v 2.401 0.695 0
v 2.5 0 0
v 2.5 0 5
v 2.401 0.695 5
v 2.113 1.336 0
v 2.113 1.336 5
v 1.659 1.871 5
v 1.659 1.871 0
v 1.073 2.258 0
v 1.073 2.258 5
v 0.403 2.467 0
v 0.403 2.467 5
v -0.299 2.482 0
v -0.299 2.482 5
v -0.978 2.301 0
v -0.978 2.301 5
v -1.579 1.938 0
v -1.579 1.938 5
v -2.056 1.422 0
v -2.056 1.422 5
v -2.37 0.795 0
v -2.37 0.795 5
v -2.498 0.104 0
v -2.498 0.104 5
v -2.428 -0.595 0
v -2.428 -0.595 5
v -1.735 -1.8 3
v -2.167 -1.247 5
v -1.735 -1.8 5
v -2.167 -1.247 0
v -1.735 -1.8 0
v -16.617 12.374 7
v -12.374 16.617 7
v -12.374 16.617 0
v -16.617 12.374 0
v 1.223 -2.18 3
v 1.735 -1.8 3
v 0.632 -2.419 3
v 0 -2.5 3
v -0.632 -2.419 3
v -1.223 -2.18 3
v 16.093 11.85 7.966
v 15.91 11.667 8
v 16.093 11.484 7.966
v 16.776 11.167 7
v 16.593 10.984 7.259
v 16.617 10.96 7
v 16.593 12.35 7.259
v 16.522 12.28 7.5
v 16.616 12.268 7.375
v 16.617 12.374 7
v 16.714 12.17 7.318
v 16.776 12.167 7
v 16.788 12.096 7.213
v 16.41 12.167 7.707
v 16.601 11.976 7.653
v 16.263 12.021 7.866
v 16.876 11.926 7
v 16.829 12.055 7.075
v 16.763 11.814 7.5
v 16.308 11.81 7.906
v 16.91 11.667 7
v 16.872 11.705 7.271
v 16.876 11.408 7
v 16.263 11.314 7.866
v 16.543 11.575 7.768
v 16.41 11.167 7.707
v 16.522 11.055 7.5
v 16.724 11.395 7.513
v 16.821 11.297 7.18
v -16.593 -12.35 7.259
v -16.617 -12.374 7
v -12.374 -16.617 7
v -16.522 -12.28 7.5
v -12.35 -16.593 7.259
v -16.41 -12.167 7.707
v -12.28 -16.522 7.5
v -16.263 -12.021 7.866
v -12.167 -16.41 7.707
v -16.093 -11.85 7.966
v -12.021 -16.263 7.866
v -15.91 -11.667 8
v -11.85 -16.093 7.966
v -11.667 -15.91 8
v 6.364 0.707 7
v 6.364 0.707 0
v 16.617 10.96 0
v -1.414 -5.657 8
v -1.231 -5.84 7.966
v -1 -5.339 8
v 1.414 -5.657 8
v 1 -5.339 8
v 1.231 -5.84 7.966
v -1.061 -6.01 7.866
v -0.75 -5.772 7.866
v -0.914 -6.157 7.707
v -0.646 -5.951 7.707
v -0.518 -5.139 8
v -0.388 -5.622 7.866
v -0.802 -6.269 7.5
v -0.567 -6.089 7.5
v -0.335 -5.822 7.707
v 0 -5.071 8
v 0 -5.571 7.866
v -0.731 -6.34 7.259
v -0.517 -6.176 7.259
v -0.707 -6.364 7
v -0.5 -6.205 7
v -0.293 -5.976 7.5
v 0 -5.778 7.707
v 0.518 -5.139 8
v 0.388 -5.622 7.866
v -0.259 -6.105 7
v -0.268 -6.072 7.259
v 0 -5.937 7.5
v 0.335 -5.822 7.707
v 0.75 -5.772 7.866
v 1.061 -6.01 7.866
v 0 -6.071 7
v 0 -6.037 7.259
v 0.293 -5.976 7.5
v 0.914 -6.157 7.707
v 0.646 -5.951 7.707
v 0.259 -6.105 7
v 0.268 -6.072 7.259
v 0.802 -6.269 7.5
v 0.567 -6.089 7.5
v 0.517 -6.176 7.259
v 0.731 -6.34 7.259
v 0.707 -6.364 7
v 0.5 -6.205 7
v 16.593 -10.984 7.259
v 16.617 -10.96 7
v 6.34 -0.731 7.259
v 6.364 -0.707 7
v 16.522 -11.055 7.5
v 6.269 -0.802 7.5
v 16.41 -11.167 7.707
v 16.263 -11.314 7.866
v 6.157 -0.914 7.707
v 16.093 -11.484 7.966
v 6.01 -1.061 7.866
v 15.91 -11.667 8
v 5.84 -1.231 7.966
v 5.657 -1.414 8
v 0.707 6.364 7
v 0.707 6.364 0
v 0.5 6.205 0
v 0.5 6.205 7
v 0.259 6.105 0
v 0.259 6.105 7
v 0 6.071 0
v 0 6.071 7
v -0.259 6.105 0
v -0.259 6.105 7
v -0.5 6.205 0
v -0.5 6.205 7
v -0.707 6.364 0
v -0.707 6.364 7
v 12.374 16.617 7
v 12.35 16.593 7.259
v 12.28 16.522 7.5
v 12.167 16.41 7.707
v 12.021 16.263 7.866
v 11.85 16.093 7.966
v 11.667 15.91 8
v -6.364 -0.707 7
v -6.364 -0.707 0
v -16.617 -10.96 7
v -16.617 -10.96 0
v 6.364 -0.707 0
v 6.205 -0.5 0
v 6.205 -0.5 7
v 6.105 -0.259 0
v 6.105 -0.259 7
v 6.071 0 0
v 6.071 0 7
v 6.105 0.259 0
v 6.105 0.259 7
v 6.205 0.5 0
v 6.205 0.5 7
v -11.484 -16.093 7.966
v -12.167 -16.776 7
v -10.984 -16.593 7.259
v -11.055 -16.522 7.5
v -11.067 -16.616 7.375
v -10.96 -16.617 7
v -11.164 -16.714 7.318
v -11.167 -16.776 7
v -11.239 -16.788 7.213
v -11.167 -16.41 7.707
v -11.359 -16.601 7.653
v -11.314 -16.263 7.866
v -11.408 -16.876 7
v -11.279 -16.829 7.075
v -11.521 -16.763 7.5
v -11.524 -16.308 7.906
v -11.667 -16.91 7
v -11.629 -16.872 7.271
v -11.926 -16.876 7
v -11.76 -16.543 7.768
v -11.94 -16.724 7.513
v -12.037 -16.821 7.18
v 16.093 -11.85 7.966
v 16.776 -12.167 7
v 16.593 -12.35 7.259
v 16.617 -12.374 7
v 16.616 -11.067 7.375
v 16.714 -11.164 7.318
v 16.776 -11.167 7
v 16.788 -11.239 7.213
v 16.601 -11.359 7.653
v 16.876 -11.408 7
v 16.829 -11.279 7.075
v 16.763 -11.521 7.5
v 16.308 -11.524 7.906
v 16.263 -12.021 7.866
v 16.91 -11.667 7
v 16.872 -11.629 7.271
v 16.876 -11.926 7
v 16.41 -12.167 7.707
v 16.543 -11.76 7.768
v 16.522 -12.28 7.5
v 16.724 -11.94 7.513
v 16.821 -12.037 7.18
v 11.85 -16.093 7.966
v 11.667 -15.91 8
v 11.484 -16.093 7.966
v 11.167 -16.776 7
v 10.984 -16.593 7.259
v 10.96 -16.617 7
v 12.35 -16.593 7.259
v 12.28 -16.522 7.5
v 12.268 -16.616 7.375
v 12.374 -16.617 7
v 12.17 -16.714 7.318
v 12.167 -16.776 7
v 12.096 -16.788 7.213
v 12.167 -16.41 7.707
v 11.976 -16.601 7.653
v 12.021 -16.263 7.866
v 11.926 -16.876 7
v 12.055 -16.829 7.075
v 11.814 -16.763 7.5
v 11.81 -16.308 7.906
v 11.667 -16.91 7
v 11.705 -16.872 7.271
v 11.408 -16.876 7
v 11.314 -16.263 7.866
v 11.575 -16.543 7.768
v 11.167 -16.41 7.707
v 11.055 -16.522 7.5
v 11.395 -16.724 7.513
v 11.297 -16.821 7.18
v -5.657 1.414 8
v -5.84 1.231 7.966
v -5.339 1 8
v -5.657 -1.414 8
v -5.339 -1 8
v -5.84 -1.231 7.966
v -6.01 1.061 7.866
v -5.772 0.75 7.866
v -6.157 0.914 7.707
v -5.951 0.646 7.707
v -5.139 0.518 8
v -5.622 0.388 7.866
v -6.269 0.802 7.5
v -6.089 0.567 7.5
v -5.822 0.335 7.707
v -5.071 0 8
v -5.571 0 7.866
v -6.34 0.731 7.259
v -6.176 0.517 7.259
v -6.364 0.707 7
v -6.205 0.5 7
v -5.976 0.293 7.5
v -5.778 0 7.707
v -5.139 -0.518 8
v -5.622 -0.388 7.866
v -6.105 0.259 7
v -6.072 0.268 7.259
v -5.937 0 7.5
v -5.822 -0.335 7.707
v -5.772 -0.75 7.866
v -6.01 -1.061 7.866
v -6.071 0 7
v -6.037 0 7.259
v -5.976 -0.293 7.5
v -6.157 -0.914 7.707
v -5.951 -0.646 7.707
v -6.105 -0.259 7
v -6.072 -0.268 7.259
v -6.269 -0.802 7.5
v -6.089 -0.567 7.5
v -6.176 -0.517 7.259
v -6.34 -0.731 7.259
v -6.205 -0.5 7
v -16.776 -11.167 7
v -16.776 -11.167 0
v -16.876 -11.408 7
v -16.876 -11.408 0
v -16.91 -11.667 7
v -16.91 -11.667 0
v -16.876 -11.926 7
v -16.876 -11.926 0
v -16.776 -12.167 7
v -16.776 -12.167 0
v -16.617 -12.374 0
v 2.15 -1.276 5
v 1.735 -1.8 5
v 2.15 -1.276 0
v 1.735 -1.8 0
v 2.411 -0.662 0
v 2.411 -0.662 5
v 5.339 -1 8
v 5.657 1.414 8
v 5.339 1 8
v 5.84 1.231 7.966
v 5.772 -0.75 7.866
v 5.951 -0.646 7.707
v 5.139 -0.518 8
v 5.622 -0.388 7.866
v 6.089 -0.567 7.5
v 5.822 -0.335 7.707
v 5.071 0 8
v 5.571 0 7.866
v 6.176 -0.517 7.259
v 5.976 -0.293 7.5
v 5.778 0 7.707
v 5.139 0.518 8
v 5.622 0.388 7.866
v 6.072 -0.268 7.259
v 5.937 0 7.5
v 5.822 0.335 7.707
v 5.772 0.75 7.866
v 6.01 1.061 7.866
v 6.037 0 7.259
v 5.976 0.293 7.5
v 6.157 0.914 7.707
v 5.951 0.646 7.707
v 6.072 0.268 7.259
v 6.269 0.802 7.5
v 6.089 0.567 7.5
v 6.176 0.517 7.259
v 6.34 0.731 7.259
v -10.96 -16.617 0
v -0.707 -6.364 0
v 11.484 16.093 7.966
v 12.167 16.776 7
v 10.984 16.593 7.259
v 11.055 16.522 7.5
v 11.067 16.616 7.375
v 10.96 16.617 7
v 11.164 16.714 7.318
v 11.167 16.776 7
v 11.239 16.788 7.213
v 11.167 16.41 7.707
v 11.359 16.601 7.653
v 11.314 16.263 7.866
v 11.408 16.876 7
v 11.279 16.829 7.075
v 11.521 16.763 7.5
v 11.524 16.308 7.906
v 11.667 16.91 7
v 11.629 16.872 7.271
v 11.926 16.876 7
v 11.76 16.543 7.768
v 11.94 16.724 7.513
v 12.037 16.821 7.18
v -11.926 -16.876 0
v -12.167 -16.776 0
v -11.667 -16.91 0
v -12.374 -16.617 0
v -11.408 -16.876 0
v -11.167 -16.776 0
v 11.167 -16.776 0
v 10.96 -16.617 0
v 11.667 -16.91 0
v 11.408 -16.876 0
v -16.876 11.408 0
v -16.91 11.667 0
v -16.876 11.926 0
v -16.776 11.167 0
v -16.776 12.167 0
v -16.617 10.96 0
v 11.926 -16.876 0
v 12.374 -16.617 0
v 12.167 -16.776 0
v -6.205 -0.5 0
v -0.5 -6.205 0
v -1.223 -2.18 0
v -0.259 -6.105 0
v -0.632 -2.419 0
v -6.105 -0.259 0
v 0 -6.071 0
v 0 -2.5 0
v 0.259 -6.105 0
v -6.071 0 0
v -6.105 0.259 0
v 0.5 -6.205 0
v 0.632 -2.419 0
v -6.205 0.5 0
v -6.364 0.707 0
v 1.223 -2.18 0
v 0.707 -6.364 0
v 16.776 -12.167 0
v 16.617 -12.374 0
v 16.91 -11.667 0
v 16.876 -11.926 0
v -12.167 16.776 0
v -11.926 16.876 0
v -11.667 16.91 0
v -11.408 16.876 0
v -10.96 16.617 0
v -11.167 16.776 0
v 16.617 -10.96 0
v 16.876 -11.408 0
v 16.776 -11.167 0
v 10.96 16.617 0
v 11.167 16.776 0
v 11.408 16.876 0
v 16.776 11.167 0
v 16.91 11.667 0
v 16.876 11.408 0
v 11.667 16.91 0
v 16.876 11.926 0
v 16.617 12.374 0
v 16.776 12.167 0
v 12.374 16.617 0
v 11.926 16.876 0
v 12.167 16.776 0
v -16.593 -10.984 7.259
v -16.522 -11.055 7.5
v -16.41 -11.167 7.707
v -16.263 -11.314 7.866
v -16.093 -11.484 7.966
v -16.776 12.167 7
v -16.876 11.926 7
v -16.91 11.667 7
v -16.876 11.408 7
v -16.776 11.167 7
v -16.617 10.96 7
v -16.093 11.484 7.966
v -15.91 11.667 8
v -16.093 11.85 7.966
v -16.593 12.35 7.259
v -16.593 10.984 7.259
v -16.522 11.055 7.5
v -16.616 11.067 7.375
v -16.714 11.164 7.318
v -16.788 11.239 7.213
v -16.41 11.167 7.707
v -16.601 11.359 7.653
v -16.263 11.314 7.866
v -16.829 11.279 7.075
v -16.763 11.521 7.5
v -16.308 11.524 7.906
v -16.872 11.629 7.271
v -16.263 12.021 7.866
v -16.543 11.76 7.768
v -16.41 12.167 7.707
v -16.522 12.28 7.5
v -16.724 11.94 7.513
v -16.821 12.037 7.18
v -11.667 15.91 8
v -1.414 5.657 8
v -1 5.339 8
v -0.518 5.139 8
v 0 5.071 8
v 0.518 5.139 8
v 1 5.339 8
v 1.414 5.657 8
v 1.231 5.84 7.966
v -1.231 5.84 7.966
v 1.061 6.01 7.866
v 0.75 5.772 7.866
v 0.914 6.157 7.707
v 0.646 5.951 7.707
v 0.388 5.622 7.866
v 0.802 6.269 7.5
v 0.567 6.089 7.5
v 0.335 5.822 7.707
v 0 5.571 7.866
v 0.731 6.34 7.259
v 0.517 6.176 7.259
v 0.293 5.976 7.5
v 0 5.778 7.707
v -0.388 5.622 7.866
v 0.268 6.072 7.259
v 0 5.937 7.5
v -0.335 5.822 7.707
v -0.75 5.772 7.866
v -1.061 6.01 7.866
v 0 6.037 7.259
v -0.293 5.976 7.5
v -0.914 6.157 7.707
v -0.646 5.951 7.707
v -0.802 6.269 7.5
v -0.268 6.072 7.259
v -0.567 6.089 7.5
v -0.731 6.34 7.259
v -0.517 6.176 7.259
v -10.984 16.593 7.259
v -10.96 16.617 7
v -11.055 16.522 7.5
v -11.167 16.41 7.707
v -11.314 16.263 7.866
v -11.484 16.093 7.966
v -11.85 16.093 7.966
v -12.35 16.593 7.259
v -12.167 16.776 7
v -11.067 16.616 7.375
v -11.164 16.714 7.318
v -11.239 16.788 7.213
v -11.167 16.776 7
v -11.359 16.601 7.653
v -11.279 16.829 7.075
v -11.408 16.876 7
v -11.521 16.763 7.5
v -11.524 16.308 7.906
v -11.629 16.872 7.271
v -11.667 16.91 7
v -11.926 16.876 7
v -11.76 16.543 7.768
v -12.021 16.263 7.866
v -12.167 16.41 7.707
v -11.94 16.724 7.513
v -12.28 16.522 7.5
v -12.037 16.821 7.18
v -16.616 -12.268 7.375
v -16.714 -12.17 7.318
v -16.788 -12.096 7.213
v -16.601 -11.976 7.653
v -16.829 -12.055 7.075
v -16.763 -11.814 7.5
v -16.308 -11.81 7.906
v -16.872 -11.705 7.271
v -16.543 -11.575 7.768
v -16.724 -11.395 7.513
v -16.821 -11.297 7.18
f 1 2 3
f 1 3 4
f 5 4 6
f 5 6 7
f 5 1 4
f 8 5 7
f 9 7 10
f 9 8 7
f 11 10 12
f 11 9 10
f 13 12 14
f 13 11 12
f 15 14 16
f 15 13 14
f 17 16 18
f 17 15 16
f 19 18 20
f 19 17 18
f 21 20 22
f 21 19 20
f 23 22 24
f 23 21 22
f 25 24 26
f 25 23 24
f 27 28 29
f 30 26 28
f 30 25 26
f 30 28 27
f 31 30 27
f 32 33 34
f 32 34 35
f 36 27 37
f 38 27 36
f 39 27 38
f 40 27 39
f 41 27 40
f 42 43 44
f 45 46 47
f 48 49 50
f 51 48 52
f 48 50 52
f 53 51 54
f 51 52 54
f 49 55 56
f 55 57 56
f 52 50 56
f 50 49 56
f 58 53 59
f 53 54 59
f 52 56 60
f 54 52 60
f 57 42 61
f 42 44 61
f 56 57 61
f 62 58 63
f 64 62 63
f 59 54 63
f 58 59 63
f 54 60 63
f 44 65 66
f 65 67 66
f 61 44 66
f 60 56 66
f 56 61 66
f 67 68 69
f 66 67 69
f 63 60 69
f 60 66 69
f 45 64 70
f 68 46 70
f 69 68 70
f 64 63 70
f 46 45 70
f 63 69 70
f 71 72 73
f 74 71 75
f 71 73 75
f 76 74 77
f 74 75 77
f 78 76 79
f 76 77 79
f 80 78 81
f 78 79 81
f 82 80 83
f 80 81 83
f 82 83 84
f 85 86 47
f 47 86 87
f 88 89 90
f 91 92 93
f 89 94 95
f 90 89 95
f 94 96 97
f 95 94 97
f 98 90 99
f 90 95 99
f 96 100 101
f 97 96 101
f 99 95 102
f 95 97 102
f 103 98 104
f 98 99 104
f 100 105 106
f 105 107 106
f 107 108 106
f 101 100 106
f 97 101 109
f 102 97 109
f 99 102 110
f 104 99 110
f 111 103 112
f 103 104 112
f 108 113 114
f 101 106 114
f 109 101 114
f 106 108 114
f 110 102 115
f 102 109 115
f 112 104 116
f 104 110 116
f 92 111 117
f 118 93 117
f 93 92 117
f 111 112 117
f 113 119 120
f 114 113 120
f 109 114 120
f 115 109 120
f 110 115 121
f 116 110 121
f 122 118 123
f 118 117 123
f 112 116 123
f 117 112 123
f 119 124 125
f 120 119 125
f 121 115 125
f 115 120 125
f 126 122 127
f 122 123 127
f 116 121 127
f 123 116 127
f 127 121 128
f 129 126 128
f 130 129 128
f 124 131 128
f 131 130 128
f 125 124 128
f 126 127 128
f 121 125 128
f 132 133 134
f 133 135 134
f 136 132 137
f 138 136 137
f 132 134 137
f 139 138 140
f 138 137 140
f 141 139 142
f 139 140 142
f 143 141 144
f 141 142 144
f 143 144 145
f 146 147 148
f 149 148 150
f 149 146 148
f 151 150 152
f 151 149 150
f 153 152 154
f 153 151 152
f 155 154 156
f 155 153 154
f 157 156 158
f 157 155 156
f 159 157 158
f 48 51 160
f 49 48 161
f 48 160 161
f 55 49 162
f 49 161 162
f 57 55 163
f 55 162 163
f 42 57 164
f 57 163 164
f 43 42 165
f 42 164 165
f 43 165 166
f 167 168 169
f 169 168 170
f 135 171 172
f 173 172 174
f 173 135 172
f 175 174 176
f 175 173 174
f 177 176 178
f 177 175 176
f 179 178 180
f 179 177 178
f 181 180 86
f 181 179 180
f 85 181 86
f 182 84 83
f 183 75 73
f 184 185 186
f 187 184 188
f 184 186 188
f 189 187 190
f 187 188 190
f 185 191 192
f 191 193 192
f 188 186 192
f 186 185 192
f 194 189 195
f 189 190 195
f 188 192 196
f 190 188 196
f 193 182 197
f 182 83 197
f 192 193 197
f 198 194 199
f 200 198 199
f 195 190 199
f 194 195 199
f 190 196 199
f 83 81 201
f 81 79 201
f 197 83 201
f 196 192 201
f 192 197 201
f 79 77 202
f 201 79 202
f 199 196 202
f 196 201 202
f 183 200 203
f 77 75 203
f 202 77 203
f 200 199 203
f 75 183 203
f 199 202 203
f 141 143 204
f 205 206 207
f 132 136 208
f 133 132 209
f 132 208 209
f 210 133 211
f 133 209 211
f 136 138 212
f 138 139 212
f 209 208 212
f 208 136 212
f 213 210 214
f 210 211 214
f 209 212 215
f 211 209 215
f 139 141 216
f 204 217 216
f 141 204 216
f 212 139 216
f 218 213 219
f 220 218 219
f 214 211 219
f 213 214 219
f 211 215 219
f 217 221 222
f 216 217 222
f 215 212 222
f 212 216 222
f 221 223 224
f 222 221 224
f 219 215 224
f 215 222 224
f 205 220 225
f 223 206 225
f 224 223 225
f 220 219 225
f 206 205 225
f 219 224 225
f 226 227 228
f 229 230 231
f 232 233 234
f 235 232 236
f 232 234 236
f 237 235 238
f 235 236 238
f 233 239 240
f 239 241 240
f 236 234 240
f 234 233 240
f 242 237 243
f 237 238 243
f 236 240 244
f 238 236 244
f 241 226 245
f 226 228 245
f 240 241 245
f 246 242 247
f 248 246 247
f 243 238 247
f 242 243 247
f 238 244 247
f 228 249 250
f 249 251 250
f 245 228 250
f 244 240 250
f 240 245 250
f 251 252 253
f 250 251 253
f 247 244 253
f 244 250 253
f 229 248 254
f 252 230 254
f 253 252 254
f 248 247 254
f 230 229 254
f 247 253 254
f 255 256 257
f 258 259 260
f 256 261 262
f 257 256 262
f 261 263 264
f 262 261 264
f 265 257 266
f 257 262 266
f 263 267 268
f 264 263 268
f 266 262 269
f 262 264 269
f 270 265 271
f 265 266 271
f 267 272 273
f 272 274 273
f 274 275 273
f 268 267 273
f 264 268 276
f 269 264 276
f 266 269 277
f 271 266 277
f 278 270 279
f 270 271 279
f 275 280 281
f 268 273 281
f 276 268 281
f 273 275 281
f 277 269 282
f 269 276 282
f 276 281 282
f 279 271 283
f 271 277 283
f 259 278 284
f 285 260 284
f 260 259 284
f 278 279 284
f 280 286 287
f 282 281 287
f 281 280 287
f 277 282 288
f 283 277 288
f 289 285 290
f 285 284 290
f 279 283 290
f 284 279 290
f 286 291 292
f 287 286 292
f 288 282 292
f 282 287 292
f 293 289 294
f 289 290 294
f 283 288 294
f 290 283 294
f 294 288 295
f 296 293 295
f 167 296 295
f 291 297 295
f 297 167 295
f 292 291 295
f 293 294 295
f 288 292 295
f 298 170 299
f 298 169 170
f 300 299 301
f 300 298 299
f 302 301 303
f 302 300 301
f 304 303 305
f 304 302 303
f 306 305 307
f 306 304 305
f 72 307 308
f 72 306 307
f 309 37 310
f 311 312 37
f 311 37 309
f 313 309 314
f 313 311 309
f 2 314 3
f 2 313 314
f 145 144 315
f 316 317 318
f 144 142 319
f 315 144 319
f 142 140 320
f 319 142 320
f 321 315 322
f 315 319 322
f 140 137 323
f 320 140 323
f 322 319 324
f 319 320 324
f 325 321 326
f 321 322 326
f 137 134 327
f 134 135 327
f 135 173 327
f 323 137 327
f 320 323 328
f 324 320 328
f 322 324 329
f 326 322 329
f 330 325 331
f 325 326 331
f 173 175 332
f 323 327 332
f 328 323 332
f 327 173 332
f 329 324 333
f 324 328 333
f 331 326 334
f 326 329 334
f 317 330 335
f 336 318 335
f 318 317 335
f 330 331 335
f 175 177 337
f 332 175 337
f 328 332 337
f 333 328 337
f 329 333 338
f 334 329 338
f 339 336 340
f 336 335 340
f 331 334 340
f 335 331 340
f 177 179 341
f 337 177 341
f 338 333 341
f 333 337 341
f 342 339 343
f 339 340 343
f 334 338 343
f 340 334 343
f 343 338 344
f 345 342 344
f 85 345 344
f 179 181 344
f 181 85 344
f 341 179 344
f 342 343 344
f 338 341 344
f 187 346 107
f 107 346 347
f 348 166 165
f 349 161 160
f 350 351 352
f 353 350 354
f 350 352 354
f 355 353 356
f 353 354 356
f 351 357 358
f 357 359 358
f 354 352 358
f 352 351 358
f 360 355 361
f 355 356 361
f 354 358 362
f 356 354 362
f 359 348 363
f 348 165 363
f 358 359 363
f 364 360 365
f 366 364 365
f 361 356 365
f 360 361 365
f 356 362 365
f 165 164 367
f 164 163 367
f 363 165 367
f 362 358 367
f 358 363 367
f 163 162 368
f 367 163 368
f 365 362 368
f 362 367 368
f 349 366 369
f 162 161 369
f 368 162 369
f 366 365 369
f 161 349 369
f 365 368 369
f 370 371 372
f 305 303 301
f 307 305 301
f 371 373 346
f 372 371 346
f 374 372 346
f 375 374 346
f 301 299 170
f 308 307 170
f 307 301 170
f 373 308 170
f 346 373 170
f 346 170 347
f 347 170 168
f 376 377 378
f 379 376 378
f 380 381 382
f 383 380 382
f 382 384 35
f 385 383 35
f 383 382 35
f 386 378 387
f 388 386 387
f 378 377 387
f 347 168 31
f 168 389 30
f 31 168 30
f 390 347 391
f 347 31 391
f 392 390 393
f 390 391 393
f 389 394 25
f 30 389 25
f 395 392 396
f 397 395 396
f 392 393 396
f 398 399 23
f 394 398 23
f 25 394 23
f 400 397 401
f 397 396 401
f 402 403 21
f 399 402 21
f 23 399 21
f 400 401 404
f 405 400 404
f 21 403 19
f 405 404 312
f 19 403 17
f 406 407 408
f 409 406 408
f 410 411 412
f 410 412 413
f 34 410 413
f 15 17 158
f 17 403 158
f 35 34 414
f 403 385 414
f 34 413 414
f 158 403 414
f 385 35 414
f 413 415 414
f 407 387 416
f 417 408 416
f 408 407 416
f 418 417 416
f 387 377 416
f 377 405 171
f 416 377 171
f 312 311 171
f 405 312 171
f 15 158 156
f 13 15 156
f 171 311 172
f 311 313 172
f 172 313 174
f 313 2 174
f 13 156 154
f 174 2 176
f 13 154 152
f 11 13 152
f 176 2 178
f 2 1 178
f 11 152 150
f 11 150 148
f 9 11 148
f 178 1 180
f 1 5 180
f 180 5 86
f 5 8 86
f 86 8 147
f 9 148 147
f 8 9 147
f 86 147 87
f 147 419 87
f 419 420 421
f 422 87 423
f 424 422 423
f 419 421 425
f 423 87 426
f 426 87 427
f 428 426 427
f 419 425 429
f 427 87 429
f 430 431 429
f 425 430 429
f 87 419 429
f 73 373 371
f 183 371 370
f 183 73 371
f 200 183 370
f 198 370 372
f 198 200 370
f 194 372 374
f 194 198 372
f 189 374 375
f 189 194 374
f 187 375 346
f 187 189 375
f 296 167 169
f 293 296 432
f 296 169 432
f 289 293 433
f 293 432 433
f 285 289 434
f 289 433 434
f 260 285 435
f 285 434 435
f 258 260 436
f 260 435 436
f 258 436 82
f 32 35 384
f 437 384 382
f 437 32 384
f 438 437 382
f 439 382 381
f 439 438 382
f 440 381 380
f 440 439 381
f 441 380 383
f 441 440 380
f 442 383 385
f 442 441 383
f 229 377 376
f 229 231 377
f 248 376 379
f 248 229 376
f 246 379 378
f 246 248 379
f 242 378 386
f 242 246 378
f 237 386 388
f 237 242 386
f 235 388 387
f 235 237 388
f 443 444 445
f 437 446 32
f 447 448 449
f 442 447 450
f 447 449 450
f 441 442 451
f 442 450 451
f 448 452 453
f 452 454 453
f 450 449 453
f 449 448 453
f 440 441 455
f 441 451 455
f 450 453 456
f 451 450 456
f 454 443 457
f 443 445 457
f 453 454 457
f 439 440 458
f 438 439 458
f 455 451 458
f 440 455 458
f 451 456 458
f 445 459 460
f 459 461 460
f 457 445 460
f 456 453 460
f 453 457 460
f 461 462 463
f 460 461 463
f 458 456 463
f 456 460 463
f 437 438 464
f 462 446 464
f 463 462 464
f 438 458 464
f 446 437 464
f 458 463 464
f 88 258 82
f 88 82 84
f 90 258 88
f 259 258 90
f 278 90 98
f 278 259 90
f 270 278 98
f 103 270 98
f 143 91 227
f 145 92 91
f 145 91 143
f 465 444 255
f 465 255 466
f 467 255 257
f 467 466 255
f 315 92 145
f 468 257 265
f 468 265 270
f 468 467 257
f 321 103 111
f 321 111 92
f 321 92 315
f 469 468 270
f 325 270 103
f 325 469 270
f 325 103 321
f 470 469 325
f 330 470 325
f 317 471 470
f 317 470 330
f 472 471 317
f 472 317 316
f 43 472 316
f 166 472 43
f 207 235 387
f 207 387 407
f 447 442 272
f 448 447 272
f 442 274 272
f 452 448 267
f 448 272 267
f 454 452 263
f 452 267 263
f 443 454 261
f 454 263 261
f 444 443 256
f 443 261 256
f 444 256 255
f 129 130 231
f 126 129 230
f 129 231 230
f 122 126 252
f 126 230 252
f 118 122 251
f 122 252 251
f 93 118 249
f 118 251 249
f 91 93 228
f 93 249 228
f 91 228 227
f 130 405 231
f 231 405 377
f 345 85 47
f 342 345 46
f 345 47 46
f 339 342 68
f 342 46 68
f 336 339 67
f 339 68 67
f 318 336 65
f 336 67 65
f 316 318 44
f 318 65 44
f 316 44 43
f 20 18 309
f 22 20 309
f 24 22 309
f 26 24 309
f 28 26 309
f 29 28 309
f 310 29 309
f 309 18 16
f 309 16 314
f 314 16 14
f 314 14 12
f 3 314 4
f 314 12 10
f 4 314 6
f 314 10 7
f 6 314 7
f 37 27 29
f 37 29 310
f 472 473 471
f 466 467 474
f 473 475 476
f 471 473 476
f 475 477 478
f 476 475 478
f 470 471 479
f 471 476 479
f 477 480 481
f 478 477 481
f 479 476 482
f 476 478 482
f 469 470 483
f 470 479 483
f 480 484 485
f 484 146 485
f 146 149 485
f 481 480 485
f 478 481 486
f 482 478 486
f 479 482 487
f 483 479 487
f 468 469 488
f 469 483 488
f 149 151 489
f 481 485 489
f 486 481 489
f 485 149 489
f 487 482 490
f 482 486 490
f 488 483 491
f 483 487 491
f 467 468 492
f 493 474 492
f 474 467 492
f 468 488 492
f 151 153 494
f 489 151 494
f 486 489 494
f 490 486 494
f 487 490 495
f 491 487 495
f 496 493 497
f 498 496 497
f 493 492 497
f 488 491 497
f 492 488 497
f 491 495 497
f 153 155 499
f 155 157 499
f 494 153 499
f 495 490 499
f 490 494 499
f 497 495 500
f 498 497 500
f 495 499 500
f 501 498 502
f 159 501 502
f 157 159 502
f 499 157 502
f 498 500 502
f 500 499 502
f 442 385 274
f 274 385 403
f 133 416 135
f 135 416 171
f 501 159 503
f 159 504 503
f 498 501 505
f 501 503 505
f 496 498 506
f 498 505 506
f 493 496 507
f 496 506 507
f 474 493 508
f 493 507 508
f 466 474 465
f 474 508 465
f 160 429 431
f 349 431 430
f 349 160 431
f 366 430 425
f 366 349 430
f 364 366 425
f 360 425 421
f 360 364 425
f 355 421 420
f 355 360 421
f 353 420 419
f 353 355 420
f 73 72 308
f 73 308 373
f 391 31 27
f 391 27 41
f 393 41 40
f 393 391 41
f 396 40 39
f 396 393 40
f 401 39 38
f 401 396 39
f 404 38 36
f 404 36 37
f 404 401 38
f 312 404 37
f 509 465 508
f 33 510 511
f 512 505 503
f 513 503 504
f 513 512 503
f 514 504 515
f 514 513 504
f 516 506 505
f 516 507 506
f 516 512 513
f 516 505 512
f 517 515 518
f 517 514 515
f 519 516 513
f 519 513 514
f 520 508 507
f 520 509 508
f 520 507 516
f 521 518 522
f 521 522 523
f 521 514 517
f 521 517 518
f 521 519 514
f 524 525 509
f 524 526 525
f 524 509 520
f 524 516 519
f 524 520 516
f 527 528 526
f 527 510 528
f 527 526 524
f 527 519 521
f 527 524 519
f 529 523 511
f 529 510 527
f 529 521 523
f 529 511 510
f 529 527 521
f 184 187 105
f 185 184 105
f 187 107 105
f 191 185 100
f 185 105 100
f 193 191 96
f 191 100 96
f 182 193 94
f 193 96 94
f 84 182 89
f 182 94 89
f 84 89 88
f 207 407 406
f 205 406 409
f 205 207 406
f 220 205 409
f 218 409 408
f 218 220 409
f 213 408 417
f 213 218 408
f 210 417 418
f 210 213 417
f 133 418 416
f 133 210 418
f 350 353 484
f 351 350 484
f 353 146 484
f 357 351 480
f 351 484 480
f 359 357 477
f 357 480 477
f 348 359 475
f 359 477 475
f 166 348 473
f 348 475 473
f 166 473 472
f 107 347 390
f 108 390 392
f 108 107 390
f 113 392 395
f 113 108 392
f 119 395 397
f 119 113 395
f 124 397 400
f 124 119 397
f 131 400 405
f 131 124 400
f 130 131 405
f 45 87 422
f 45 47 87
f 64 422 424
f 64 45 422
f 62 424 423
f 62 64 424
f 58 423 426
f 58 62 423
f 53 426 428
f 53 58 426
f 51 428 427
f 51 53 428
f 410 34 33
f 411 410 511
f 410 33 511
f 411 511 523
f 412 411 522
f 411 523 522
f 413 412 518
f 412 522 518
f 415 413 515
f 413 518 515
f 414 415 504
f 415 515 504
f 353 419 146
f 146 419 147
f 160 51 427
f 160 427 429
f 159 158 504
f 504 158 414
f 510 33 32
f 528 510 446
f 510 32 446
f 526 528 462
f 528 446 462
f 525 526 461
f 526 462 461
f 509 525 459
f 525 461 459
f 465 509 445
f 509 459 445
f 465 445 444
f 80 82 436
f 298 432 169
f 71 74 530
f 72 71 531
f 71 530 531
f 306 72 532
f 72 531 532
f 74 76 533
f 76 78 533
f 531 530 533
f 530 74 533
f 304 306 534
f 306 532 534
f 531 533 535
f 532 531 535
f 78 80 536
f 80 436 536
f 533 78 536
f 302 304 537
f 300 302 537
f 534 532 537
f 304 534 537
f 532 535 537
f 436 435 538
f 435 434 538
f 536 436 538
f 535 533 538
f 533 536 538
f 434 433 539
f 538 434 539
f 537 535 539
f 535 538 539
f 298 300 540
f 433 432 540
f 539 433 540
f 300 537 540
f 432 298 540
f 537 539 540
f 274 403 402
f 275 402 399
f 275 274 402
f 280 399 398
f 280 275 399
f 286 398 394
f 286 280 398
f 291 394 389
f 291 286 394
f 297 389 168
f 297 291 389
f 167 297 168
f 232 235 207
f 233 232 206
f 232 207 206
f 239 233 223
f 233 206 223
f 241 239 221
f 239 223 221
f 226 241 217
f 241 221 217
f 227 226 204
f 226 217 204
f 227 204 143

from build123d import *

# Parameters (mm, degrees)
F1_DEPTH = 8
F2_R     = 1
F3_DEPTH = 5
F4_DEPTH = 3


with BuildPart() as f1:
    # F0 (on Top) → F1 (new body)
    with BuildSketch(Plane.XY):
        Polygon((-11.6672618896, 17.3241161391), (-17.3241161391, 11.6672618896), (-5.6568542495, 0), (-17.3241161391, -11.6672618896), (-11.6672618896, -17.3241161391), (0, -5.6568542495), (11.6672618896, -17.3241161391), (17.3241161391, -11.6672618896), (5.6568542495, 0), (17.3241161391, 11.6672618896), (11.6672618896, 17.3241161391), (0, 5.6568542495), align=None)
        with BuildLine():
            ThreePointArc((-1.7349351573, -1.8), (-0.9779218033, 2.3007974588), (2.5, 0))
            ThreePointArc((2.5, 0), (2.3007974588, -0.9779218033), (1.7349351573, -1.8))
            ThreePointArc((1.7349351573, -1.8), (0, -2.5), (-1.7349351573, -1.8))
        make_face(mode=Mode.SUBTRACT)
        with BuildLine():
            Line((1.7349351573, -1.8), (-1.7349351573, -1.8))
            ThreePointArc((-1.7349351573, -1.8), (0, -2.5), (1.7349351573, -1.8))
        make_face()
        with BuildLine():
            ThreePointArc((1.7349351573, -1.8), (2.3007974588, -0.9779218033), (2.5, 0))
            ThreePointArc((2.5, 0), (-0.9779218033, 2.3007974588), (-1.7349351573, -1.8))
            Line((-1.7349351573, -1.8), (1.7349351573, -1.8))
        make_face()
    extrude(amount=F1_DEPTH)

    # F2
    f2_edges = [f1.edges().sort_by_distance(p)[0] for p in [
        (-14.495689, 14.495689, 8),
        (-11.490485, 5.833631, 8),
        (-11.490485, -5.833631, 8),
        (-14.495689, -14.495689, 8),
        (-5.833631, -11.490485, 8),
        (5.833631, -11.490485, 8),
        (14.495689, -14.495689, 8),
        (11.490485, -5.833631, 8),
        (11.490485, 5.833631, 8),
        (14.495689, 14.495689, 8),
        (5.833631, 11.490485, 8),
        (-5.833631, 11.490485, 8),
        (-11.667262, -17.324116, 4),
        (-17.324116, -11.667262, 4),
        (-17.324116, 11.667262, 4),
        (11.667262, -17.324116, 4),
        (17.324116, -11.667262, 4),
        (17.324116, 11.667262, 4),
        (11.667262, 17.324116, 4),
        (-11.667262, 17.324116, 4),
        (0, 5.656854, 4),
        (-5.656854, 0, 4),
        (0, -5.656854, 4),
        (5.656854, 0, 4),
    ]]
    fillet(f2_edges, radius=F2_R)

    # F0 (on Top) → F3 (cut)
    with BuildSketch(Plane.XY):
        with BuildLine():
            ThreePointArc((1.7349351573, -1.8), (2.3007974588, -0.9779218033), (2.5, 0))
            ThreePointArc((2.5, 0), (-0.9779218033, 2.3007974588), (-1.7349351573, -1.8))
            Line((-1.7349351573, -1.8), (1.7349351573, -1.8))
        make_face()
    extrude(amount=F3_DEPTH, mode=Mode.SUBTRACT)

    # F0 (on Top) → F4 (cut)
    with BuildSketch(Plane.XY):
        with BuildLine():
            Line((1.7349351573, -1.8), (-1.7349351573, -1.8))
            ThreePointArc((-1.7349351573, -1.8), (0, -2.5), (1.7349351573, -1.8))
        make_face()
    extrude(amount=F4_DEPTH, mode=Mode.SUBTRACT)


solid = f1.part
